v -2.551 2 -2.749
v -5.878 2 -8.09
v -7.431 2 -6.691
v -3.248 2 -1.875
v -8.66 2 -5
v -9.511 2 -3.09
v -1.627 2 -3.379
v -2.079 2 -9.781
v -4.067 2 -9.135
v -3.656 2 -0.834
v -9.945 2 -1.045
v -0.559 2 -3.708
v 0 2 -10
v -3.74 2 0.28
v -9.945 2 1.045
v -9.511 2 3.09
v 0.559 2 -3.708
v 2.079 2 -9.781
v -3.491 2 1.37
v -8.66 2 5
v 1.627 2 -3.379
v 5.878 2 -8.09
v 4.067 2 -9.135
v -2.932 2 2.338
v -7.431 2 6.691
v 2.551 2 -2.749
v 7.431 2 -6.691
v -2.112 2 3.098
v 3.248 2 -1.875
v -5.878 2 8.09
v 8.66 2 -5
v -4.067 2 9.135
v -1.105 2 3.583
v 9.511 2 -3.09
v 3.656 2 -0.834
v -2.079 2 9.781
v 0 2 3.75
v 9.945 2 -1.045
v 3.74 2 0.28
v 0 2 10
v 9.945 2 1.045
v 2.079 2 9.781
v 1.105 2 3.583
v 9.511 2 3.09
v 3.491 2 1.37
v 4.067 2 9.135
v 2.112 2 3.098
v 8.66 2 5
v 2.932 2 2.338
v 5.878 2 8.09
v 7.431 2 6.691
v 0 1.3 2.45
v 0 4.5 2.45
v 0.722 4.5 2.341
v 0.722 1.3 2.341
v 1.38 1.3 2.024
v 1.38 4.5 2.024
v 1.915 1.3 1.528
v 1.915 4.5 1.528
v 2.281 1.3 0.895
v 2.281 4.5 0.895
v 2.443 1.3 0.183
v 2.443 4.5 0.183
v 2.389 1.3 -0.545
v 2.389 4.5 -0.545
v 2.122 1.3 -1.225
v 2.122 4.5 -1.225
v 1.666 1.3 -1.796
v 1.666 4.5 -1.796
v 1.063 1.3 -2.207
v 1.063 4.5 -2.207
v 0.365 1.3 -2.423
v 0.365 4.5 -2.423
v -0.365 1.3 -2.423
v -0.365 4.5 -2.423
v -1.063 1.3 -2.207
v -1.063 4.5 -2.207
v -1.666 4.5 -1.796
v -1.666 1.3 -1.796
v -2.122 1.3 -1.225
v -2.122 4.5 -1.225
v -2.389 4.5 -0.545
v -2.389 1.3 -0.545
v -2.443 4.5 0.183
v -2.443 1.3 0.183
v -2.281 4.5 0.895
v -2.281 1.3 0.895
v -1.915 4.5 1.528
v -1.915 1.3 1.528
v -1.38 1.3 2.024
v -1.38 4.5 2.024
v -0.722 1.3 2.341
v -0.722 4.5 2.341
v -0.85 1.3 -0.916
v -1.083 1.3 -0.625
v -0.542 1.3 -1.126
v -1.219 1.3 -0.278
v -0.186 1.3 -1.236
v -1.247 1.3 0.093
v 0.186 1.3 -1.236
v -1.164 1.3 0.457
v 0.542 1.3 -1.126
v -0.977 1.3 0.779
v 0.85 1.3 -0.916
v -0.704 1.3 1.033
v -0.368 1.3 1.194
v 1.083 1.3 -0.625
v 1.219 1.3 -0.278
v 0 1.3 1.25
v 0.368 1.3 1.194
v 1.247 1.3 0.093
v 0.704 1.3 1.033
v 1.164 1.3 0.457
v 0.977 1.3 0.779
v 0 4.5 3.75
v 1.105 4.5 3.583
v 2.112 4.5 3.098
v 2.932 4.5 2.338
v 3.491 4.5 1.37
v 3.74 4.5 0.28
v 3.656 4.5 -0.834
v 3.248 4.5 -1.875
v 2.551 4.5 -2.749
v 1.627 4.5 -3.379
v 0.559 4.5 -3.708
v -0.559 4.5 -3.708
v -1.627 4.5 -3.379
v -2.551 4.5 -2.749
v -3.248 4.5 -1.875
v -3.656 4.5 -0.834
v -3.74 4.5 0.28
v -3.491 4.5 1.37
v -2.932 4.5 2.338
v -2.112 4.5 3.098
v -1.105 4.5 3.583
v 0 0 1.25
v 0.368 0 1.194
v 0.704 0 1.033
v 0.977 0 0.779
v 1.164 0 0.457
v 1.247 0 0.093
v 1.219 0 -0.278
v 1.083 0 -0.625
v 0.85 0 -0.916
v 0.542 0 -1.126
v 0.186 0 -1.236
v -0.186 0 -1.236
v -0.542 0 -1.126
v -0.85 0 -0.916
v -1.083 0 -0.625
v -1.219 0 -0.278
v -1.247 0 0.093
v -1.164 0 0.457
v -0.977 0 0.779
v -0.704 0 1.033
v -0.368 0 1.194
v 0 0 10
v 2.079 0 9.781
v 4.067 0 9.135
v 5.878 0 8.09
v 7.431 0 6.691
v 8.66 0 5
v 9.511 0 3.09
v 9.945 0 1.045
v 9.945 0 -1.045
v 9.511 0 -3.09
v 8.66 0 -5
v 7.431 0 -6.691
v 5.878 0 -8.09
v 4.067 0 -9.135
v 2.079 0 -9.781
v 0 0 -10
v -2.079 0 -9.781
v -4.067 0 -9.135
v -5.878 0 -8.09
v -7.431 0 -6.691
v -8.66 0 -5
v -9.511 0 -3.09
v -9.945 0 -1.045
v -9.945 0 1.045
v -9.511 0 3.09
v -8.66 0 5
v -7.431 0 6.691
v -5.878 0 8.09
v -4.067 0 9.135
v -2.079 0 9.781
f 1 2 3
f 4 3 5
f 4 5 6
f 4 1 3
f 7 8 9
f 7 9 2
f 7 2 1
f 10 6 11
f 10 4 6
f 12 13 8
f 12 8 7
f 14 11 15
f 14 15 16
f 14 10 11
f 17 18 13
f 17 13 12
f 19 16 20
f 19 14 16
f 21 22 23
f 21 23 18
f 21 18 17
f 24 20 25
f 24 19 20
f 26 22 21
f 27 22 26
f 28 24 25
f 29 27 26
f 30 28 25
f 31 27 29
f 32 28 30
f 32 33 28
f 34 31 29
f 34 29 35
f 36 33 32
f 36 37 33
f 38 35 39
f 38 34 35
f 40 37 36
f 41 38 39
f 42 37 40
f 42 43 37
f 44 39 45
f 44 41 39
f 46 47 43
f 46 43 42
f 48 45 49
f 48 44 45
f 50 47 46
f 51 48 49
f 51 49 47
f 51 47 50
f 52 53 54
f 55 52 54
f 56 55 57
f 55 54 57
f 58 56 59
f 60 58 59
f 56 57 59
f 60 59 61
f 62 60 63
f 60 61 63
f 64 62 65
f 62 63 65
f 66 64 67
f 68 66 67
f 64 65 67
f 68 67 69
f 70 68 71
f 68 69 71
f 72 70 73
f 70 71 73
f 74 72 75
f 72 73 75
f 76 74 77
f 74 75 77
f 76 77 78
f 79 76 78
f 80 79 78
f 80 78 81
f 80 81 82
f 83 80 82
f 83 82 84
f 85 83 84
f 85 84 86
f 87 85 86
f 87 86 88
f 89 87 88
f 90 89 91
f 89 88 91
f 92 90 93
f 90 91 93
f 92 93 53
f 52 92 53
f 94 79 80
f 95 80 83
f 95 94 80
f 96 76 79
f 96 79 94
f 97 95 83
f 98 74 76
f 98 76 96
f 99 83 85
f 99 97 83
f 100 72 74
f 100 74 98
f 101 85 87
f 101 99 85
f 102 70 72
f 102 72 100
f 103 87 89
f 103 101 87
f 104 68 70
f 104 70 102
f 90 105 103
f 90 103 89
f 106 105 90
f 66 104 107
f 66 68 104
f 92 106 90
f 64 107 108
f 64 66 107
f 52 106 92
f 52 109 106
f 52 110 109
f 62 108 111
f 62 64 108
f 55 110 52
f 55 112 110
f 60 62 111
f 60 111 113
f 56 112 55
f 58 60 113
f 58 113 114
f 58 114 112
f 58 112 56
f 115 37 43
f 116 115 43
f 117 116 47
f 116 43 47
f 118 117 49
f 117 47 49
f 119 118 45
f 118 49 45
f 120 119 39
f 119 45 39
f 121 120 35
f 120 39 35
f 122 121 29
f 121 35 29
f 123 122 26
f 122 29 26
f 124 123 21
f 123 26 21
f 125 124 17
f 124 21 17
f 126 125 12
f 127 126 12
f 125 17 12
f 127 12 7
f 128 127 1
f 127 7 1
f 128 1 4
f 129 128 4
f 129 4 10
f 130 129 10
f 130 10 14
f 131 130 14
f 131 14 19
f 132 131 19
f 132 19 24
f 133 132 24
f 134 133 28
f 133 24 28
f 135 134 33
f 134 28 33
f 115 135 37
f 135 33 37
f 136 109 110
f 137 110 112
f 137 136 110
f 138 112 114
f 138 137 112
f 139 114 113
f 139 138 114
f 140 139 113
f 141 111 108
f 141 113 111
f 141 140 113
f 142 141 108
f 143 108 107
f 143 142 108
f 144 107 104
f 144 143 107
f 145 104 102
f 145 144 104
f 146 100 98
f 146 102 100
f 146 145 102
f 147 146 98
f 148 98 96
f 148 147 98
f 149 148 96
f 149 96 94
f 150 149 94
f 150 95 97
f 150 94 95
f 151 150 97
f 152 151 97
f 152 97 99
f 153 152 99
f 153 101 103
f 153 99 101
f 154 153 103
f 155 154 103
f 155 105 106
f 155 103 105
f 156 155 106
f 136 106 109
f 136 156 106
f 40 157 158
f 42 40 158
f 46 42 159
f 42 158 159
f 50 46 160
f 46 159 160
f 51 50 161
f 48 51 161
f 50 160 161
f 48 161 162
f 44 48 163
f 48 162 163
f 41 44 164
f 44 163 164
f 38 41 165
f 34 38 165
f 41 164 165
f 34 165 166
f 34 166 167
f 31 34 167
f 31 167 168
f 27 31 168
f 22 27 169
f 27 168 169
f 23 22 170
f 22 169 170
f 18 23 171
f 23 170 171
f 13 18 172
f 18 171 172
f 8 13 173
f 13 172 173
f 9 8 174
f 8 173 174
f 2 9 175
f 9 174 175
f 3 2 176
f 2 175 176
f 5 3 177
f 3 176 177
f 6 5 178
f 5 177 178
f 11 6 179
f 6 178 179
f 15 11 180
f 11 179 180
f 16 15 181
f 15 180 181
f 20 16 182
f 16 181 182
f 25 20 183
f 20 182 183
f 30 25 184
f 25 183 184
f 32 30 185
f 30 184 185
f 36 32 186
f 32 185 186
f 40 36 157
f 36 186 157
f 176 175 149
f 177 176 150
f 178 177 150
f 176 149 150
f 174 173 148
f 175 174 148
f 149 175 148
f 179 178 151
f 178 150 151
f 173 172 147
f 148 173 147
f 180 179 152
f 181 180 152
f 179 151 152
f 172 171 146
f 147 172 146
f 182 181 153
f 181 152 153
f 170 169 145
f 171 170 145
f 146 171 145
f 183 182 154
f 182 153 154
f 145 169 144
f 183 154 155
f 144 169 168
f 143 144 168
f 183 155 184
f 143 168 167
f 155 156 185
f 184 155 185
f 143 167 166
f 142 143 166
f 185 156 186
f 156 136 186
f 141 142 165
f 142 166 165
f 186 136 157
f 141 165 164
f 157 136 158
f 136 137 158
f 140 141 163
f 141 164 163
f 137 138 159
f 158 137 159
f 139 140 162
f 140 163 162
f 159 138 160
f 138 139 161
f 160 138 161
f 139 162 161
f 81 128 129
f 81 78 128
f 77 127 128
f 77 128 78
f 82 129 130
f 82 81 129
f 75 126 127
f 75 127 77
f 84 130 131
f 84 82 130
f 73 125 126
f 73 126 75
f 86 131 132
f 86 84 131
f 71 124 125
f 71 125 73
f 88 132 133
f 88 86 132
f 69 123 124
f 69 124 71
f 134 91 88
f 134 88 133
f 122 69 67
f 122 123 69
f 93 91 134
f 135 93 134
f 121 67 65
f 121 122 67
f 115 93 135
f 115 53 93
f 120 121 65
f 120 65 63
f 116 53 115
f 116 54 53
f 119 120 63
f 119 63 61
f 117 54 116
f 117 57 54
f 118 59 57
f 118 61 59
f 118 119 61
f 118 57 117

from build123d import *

# Parameters (mm, degrees)
SKETCH_1_R          = 10
SKETCH_1_R_2        = 1.25
EXTRUDE_1_DEPTH     = 2
SKETCH_2_R          = 3.75
EXTRUDE_2_DEPTH     = 2.5
SKETCH_4_R          = 2.45
CUT_EXTRUDE_1_DEPTH = 3.2


with BuildPart() as part:
    # 草图1 → 凸台-拉伸1 (new body)
    with BuildSketch(Plane(origin=(0, 0, 0), x_dir=(1, 0, 0), z_dir=(0, 1, 0))):
        with Locations(Location((0, 0, 0), (0, 0, 270))):
            Circle(SKETCH_1_R)
        with Locations(Location((0, 0, 0), (0, 0, 270))):
            Circle(SKETCH_1_R_2, mode=Mode.SUBTRACT)
    extrude(amount=EXTRUDE_1_DEPTH)

    # 草图2 → 凸台-拉伸2 (add)
    with BuildSketch(Plane(origin=(0, 2, 0), x_dir=(1, 0, 0), z_dir=(0, 1, 0))):
        with Locations(Location((0, 0, 0), (0, 0, 270))):
            Circle(SKETCH_2_R)
    extrude(amount=EXTRUDE_2_DEPTH)

    # 草图4 → 切除-拉伸1 (cut)
    with BuildSketch(Plane(origin=(0, 4.5, 0), x_dir=(1, 0, 0), z_dir=(0, 1, 0))):
        with Locations(Location((0, 0, 0), (0, 0, 270))):
            Circle(SKETCH_4_R)
    extrude(amount=-CUT_EXTRUDE_1_DEPTH, mode=Mode.SUBTRACT)


solid = part.part
